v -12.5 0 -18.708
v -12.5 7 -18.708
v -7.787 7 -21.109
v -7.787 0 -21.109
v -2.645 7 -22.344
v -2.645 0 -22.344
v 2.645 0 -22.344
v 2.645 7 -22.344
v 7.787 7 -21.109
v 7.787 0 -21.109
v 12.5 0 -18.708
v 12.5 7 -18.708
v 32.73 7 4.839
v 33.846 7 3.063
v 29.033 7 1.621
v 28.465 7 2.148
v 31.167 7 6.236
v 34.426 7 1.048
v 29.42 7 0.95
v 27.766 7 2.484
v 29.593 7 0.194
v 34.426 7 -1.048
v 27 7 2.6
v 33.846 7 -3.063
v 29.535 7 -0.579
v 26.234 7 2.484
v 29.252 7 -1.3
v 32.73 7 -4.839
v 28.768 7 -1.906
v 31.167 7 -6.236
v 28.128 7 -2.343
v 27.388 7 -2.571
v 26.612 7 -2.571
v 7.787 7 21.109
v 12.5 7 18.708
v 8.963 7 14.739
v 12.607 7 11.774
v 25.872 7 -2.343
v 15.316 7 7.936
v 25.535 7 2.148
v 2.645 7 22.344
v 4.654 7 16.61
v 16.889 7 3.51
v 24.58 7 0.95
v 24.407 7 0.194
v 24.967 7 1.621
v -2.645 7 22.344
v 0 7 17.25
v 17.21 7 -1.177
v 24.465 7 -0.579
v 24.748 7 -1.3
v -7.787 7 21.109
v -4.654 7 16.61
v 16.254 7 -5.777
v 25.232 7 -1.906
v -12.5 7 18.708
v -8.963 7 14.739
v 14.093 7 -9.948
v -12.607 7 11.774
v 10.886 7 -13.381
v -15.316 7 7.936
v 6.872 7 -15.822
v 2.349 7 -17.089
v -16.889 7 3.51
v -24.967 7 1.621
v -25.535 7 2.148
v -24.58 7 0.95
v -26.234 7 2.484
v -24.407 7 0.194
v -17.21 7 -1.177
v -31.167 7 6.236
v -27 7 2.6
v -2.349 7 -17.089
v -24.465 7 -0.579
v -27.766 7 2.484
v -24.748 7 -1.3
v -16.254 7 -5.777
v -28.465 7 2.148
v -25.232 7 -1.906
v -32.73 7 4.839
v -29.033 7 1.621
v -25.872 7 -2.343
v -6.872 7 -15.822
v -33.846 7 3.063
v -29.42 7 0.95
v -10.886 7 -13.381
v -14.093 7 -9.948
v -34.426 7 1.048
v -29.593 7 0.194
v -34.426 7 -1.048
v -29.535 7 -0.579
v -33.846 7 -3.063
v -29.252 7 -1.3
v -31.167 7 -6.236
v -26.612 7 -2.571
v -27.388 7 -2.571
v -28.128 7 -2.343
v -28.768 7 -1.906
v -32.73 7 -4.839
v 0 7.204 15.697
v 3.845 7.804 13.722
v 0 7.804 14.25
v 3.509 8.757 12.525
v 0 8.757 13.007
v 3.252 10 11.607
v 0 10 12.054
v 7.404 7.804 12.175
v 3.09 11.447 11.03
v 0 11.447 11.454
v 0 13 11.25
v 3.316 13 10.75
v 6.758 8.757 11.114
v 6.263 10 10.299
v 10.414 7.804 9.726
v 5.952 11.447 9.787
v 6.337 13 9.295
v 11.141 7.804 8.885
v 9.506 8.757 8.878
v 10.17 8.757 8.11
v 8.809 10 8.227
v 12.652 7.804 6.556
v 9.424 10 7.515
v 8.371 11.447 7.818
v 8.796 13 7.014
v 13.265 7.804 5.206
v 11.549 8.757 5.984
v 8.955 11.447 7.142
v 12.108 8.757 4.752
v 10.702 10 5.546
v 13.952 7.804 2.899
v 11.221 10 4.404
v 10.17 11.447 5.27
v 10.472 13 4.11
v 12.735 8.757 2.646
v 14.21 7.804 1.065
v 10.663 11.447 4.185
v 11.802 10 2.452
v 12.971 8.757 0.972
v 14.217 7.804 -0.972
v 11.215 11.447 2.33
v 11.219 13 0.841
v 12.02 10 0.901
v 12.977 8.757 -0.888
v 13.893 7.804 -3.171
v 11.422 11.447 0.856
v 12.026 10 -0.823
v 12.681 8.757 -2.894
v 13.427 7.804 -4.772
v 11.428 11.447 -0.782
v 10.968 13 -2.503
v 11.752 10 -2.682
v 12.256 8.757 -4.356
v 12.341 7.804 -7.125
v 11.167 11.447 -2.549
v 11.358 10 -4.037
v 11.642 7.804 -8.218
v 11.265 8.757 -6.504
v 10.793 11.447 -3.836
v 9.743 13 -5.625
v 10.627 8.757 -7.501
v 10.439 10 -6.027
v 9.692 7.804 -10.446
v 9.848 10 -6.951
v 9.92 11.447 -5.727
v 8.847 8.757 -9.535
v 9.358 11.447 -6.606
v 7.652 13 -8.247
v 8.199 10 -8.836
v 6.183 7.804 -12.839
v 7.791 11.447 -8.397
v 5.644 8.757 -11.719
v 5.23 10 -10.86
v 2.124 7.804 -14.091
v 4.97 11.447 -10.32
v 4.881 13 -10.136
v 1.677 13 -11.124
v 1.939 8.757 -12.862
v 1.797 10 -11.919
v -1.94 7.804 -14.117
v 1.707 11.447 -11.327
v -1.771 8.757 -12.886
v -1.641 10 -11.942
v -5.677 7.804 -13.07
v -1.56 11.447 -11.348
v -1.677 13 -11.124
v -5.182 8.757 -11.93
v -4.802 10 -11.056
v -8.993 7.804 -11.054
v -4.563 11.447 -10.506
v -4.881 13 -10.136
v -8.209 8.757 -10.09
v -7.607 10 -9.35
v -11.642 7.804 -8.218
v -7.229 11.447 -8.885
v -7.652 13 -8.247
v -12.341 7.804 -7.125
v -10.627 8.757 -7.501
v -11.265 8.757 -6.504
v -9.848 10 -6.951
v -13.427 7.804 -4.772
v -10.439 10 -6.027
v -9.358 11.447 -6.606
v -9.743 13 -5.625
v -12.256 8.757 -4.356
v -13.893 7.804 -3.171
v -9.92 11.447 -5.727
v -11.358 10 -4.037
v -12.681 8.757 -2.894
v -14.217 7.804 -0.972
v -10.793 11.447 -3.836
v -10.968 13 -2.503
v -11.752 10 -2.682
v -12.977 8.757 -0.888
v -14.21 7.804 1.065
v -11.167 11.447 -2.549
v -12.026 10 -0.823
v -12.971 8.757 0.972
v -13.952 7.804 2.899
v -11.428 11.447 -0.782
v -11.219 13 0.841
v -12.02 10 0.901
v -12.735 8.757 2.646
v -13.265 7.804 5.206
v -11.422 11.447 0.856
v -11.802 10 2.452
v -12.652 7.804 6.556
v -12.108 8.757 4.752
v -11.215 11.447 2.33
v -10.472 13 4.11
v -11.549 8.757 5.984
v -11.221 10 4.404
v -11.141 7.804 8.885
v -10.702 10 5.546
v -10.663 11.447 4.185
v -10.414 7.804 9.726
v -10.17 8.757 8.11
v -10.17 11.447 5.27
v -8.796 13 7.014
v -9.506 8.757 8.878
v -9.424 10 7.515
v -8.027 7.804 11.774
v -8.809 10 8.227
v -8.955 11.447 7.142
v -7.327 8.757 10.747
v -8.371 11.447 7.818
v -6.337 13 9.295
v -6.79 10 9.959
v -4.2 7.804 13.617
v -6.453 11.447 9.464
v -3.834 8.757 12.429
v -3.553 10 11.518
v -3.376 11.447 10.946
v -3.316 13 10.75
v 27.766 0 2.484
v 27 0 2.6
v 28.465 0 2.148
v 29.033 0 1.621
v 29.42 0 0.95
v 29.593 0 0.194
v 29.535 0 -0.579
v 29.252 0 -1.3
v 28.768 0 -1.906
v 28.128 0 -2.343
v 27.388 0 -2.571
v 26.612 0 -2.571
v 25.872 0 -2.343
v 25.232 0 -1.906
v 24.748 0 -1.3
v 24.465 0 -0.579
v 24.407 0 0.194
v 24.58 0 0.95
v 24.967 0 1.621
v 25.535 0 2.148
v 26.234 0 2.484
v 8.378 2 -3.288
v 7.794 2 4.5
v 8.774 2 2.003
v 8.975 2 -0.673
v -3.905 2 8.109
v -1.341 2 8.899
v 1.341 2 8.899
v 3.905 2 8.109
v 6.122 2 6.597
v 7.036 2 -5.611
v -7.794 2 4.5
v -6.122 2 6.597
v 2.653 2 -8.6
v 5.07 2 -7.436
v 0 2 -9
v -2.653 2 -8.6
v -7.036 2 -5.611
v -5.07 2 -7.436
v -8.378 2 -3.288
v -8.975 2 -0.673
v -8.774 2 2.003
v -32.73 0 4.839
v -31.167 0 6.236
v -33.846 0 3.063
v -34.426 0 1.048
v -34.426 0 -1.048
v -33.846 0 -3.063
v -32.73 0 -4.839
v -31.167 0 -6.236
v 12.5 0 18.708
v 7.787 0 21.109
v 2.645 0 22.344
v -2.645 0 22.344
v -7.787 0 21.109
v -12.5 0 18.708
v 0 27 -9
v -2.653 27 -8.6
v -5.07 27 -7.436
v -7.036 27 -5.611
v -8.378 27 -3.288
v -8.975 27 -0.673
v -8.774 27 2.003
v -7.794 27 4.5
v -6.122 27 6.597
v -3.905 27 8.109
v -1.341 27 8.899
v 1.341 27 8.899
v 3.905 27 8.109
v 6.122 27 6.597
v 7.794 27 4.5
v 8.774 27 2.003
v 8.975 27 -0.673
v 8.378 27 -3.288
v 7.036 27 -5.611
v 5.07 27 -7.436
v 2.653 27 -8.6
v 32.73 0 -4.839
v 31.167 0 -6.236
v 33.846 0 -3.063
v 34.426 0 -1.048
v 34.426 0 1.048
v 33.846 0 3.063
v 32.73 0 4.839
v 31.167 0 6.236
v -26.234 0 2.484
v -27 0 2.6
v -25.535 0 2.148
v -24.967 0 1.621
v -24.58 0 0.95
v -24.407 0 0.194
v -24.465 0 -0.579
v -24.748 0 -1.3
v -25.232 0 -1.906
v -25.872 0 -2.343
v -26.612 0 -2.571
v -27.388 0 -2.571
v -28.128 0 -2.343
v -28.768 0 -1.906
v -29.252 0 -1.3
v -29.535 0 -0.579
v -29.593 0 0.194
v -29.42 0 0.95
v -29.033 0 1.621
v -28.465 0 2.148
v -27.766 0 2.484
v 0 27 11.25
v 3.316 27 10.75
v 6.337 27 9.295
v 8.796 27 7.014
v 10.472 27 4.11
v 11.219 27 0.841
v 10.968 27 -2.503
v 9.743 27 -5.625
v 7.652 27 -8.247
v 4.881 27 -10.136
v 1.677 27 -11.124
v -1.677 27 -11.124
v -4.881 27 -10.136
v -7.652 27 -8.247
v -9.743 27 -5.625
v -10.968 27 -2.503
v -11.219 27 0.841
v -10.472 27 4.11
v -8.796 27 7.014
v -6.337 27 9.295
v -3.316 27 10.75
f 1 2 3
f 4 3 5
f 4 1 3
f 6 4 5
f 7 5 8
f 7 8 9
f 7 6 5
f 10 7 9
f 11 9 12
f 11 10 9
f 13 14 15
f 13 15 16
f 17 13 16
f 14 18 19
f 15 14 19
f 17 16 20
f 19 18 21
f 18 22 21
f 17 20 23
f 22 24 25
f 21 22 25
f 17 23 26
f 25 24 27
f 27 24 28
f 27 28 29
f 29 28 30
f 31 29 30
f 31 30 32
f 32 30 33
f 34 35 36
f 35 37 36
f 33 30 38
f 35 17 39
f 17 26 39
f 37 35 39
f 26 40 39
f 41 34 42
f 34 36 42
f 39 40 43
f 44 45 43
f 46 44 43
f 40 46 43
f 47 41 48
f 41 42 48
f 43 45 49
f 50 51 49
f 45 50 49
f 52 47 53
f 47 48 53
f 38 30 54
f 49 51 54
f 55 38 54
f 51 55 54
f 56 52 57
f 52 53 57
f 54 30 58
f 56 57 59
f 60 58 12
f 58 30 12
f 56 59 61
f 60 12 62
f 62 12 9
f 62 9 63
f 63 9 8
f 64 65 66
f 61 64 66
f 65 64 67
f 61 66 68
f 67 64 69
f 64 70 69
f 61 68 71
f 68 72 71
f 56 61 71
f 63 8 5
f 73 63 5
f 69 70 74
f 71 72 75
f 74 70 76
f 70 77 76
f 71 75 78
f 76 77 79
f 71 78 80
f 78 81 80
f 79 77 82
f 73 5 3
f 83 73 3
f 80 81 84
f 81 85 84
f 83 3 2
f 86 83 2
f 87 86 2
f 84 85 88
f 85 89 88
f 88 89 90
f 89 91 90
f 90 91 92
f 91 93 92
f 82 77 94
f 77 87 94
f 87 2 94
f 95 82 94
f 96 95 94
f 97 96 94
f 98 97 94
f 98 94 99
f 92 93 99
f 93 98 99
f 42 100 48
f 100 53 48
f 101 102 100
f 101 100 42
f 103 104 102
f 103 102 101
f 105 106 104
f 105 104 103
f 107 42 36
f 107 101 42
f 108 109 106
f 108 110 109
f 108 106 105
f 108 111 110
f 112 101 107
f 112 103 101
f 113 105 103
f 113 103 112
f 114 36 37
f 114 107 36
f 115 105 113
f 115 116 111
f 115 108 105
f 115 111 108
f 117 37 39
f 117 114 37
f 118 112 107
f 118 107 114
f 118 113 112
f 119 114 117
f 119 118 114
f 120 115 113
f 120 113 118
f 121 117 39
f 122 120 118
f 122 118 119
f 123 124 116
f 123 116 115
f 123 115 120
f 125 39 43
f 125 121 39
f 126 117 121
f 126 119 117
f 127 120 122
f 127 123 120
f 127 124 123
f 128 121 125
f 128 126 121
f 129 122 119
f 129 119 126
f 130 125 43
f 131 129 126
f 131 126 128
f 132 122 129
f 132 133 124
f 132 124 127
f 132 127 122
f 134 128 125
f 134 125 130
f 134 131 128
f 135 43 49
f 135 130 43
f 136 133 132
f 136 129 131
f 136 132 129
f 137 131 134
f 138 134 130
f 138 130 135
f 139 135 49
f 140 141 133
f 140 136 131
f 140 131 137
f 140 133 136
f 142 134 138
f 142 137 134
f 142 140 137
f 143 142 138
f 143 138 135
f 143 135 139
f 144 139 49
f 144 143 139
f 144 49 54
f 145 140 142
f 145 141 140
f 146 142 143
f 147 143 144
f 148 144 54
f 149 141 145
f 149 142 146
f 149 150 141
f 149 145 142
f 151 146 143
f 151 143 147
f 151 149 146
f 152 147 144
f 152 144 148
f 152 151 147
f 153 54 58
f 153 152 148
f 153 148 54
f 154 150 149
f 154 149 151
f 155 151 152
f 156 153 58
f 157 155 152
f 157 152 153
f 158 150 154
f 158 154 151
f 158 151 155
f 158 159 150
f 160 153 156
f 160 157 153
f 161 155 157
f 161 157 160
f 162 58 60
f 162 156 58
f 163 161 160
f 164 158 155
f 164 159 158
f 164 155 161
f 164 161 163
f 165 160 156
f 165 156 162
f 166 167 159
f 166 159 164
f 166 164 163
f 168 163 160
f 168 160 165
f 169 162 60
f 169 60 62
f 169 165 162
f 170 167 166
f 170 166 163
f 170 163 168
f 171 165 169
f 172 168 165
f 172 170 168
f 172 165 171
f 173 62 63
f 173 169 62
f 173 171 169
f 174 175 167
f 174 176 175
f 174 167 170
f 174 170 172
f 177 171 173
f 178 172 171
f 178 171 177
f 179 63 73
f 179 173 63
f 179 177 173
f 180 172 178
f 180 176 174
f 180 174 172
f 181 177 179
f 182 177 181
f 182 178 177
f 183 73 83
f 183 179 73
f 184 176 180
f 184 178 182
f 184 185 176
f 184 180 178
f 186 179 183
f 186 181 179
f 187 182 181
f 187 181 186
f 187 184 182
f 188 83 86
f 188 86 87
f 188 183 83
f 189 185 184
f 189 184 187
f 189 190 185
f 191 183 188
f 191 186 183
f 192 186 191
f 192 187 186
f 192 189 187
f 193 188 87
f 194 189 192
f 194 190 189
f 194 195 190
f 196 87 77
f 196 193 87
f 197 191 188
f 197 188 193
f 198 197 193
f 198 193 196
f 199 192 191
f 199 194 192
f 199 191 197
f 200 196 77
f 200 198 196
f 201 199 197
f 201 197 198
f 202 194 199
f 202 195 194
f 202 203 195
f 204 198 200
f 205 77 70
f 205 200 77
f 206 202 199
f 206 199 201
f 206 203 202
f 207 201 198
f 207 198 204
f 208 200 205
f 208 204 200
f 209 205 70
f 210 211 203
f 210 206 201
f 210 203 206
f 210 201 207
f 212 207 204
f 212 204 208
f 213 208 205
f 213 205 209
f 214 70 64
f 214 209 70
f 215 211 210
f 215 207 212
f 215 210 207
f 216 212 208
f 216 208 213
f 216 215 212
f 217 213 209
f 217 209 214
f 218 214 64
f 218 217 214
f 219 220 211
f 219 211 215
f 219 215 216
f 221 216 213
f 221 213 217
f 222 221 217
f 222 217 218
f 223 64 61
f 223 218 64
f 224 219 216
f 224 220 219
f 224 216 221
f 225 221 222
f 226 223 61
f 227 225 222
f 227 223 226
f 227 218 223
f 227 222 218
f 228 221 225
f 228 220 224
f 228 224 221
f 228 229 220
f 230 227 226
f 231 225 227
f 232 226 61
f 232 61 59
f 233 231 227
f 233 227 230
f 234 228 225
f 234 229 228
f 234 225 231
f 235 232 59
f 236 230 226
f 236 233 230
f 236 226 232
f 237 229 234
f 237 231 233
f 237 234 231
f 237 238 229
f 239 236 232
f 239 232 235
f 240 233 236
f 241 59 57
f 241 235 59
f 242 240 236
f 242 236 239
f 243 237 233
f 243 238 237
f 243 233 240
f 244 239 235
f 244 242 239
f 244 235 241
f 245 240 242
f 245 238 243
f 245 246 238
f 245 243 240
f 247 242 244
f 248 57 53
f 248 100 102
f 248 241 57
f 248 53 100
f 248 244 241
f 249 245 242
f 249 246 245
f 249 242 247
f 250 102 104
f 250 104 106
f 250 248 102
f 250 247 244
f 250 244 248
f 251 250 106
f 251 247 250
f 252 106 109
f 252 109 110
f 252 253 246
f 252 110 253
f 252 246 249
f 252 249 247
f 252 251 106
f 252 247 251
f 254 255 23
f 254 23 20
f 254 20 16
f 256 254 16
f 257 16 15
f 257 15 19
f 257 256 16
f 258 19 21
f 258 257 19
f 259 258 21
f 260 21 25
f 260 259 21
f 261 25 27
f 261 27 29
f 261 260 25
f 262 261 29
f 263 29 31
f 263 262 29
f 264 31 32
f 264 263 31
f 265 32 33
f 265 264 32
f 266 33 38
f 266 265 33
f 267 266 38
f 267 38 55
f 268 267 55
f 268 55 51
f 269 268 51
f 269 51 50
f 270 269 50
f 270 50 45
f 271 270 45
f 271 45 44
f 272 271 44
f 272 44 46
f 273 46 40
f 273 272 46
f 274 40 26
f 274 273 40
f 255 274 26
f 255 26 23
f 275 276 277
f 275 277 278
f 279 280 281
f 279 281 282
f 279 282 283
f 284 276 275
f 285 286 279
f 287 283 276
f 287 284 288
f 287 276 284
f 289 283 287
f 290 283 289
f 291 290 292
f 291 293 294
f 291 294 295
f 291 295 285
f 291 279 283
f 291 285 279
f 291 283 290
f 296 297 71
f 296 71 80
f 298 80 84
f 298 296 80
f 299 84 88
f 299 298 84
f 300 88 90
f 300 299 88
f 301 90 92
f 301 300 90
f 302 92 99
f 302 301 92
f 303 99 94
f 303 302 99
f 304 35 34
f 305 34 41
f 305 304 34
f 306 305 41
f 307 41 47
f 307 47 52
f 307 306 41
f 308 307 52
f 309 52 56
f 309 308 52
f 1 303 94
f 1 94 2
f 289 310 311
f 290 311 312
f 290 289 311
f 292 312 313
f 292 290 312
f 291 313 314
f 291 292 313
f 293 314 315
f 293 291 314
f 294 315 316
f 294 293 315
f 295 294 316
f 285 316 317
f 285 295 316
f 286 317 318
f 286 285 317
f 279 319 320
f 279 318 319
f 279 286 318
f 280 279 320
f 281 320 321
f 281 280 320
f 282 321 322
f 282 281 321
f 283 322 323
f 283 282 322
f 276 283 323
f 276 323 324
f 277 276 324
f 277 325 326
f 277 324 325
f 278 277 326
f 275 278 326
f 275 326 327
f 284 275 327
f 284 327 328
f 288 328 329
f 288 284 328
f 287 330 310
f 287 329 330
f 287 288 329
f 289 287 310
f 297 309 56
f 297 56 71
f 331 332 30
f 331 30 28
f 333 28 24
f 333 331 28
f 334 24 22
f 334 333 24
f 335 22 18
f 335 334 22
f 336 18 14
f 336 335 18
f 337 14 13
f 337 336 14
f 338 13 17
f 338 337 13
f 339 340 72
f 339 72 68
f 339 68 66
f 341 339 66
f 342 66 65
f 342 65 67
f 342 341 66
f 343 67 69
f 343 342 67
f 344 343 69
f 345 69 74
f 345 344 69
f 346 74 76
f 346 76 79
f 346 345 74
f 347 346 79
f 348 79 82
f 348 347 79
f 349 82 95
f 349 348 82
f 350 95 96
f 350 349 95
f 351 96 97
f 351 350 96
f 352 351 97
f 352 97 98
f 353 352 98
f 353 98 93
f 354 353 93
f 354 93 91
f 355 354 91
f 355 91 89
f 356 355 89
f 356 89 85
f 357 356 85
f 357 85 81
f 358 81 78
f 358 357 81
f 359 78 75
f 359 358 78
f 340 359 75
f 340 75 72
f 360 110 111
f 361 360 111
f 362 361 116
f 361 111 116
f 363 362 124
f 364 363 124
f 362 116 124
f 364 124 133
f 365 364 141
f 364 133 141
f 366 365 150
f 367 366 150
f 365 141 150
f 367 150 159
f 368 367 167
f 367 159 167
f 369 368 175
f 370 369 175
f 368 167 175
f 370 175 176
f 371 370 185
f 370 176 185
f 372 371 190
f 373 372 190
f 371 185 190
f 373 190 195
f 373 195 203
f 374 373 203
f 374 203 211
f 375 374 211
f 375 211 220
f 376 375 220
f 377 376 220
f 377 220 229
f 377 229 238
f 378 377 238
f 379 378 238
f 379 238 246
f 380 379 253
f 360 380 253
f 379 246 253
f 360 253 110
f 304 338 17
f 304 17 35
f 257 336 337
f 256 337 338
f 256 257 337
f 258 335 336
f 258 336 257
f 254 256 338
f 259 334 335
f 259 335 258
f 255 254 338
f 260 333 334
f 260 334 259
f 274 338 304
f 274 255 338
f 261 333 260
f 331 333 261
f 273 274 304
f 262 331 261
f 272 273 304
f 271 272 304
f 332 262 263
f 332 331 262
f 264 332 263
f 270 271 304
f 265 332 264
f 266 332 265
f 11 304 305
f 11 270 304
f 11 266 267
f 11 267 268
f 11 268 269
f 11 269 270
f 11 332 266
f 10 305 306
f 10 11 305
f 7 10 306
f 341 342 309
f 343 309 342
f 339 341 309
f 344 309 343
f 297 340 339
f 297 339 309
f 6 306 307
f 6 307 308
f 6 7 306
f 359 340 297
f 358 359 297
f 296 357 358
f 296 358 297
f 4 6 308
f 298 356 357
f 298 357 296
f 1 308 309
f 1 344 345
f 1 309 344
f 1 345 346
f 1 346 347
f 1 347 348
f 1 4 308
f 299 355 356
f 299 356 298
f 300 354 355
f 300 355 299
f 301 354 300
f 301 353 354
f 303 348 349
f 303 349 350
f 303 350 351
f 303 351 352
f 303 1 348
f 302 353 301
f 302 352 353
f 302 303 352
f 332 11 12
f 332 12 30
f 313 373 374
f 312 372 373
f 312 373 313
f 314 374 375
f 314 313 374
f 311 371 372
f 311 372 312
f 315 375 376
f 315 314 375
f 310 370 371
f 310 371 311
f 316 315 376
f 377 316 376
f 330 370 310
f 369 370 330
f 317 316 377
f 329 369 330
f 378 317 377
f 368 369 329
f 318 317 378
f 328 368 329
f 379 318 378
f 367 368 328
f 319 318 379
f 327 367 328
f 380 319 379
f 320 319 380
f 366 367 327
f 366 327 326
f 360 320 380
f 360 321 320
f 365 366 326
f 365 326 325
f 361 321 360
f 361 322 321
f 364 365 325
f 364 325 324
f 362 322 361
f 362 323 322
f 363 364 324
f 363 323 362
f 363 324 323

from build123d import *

# Parameters (mm, degrees)
IZIM1_R                     = 2.6
Y_KSEKLIK_EKSTR_ZYON1_DEPTH = 7
IZIM3_R                     = 11.25
IZIM3_R_2                   = 8
Y_KSEKLIK_EKSTR_ZYON2_DEPTH = 20
KES_EKSTR_ZYON1_DEPTH       = 40
KES_EKSTR_ZYON1_DEPTH_BACK  = 5
IZIM4_R                     = 9
RADYUS2_R                   = 6


with BuildPart() as part:
    # Çizim1 → Yükseklik-Ekstrüzyon1 (new body)
    with BuildSketch(Plane(origin=(0, 0, 0), x_dir=(1, 0, 0), z_dir=(0, 1, 0))):
        with BuildLine():
            Line((-31.166666667, 6.236095645), (-12.5, 18.708286934))
            ThreePointArc((-12.5, 18.708286934), (0, 22.5), (12.5, 18.708286934))
            Line((12.5, 18.708286934), (31.166666667, 6.236095645))
            ThreePointArc((31.166666667, 6.236095645), (34.5, 0), (31.166666667, -6.236095645))
            Line((31.166666667, -6.236095645), (12.5, -18.708286934))
            ThreePointArc((12.5, -18.708286934), (0, -22.5), (-12.5, -18.708286934))
            Line((-12.5, -18.708286934), (-31.166666667, -6.236095645))
            ThreePointArc((-31.166666667, -6.236095645), (-34.5, 0), (-31.166666667, 6.236095645))
        make_face()
        with Locations(Location((-27, 0, 0), (0, 0, 270))):
            Circle(IZIM1_R, mode=Mode.SUBTRACT)
        with Locations(Location((27, 0, 0), (0, 0, 270))):
            Circle(IZIM1_R, mode=Mode.SUBTRACT)
    extrude(amount=Y_KSEKLIK_EKSTR_ZYON1_DEPTH)

    # Çizim3 → Yükseklik-Ekstrüzyon2 (add)
    with BuildSketch(Plane(origin=(0, 7, 0), x_dir=(1, 0, 0), z_dir=(0, 1, 0))):
        with Locations(Location((0, 0, 0), (0, 0, 270))):
            Circle(IZIM3_R)
        with Locations(Location((0, 0, 0), (0, 0, 270))):
            Circle(IZIM3_R_2, mode=Mode.SUBTRACT)
    extrude(amount=Y_KSEKLIK_EKSTR_ZYON2_DEPTH)

    # Çizim4 → Kes-Ekstrüzyon1 (cut, two sides: drawn at the far end of the back side and taken through both)
    with BuildSketch(Plane(origin=(0, 7, 0), x_dir=(1, 0, 0), z_dir=(0, 1, 0)).offset(-KES_EKSTR_ZYON1_DEPTH_BACK)):
        with Locations(Location((0, 0, 0), (0, 0, 90))):
            Circle(IZIM4_R)
    extrude(amount=KES_EKSTR_ZYON1_DEPTH + KES_EKSTR_ZYON1_DEPTH_BACK, mode=Mode.SUBTRACT)

    # Radyus2
    radyus2_edges = [part.edges().sort_by_distance(p)[0] for p in [
        (0, 7, -11.25),
    ]]
    fillet(radyus2_edges, radius=RADYUS2_R)


solid = part.part
